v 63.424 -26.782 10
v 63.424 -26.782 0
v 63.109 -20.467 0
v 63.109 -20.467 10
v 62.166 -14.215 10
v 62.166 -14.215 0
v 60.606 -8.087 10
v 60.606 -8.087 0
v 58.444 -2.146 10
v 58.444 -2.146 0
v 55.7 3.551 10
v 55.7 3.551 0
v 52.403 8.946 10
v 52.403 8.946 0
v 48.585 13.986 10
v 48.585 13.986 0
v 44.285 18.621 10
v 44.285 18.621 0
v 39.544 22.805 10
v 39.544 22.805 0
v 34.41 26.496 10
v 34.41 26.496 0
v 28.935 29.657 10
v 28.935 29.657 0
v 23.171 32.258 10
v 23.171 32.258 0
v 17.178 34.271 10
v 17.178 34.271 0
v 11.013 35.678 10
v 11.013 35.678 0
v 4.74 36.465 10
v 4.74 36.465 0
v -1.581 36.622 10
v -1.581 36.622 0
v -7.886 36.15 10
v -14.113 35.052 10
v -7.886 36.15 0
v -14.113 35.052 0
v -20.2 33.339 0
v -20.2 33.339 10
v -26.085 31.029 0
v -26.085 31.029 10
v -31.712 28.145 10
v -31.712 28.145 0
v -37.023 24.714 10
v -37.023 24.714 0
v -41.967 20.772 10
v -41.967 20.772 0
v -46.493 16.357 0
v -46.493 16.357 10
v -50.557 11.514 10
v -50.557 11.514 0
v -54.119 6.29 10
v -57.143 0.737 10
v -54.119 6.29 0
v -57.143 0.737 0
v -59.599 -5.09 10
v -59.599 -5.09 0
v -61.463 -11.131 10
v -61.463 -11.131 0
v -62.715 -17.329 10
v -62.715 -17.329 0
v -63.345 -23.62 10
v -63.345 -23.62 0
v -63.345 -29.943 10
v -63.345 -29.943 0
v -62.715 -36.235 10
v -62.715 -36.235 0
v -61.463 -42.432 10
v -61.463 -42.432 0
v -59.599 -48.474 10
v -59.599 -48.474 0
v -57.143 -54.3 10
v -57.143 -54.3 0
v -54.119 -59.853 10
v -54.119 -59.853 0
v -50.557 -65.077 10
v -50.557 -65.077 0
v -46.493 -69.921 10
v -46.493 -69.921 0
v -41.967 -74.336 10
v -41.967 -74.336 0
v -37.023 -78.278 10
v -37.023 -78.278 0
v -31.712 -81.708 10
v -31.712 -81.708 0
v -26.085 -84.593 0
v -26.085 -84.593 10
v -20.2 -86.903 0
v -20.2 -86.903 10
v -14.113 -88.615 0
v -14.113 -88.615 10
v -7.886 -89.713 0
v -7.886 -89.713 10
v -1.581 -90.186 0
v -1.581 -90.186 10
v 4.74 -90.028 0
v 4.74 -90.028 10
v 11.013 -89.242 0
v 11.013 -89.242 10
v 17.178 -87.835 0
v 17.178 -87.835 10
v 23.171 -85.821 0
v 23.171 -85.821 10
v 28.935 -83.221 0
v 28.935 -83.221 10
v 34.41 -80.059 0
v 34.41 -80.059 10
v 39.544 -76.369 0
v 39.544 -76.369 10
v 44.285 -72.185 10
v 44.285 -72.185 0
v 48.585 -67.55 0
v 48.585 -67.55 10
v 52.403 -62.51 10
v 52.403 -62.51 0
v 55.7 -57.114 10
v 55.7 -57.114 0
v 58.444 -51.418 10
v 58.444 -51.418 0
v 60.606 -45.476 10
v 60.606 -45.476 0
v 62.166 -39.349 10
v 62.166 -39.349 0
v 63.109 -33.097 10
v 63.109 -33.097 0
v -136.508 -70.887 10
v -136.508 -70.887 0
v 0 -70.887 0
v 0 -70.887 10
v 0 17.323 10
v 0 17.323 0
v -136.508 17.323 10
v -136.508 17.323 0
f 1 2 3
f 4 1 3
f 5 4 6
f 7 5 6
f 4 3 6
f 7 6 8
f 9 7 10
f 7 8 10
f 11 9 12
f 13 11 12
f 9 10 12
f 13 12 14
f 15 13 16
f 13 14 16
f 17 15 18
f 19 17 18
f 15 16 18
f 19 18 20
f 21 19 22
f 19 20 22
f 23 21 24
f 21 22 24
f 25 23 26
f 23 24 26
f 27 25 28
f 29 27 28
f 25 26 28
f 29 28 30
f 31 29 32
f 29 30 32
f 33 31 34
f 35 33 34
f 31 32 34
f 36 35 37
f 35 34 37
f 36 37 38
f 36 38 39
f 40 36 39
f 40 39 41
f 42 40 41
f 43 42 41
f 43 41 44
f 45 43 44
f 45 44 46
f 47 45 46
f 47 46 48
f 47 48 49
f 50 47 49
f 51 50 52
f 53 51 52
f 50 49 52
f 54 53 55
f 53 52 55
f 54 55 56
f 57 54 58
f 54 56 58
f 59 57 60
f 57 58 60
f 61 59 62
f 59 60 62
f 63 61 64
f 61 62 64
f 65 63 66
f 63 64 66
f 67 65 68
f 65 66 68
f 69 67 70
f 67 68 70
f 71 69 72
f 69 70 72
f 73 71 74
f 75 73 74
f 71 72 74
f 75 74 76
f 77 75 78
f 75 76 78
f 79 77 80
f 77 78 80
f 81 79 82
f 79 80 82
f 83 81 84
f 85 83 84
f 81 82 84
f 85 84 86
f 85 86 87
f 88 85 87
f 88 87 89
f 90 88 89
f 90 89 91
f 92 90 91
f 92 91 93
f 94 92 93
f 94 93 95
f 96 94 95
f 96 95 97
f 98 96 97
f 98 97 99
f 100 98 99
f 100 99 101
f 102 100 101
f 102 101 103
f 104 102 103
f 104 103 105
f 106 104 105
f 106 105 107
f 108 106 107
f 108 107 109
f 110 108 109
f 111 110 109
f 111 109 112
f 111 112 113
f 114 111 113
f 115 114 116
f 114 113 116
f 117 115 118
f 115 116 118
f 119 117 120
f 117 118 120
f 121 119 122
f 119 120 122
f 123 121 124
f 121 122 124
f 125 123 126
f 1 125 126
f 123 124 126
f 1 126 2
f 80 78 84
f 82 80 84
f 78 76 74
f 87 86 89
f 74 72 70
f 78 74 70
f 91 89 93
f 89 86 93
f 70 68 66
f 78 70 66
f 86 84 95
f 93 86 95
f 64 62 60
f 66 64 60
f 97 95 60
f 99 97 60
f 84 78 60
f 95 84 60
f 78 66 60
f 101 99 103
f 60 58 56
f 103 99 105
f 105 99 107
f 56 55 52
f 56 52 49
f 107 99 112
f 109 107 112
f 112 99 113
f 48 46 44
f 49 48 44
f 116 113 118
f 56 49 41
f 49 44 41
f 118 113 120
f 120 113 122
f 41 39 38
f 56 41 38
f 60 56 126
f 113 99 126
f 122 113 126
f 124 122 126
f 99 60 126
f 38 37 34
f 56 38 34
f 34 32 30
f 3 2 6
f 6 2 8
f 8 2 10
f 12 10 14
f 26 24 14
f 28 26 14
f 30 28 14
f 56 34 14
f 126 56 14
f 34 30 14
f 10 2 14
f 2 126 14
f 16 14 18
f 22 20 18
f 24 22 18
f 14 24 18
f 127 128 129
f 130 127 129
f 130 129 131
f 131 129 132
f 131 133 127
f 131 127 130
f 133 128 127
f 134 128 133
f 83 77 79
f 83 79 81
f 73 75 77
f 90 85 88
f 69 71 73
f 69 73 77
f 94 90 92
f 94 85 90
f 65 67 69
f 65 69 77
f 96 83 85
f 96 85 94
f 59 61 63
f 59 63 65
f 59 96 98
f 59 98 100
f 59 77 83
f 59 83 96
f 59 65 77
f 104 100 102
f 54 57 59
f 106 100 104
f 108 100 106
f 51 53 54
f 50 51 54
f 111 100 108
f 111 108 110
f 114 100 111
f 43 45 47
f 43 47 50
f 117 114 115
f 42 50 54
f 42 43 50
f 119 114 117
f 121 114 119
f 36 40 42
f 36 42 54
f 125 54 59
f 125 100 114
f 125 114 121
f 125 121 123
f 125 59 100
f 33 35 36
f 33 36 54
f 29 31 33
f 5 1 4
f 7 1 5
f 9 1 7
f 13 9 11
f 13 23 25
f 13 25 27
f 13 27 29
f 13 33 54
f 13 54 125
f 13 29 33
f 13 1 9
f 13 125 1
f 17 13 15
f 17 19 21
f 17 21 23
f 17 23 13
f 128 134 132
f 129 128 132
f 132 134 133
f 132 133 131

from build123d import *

# Parameters (mm, degrees)
F0_W     = 136.5081220865
F0_H     = 88.2100593299
F2_DEPTH = 10
F1_R     = 63.4238


with BuildPart() as f2:
    # F0 (on Top) → F2 (new body)
    with BuildSketch(Plane.XY):
        with Locations((-68.2540610433, -26.7817908898)):
            Rectangle(F0_W, F0_H)
    extrude(amount=F2_DEPTH)


with BuildPart() as f2b:
    # F1 (on Top) → F2, piece 2 (new body)
    with BuildSketch(Plane.XY):
        with Locations((0, -26.7817908898)):
            Circle(F1_R)
    extrude(amount=F2_DEPTH)


solid = Compound([f2.part, f2b.part])
